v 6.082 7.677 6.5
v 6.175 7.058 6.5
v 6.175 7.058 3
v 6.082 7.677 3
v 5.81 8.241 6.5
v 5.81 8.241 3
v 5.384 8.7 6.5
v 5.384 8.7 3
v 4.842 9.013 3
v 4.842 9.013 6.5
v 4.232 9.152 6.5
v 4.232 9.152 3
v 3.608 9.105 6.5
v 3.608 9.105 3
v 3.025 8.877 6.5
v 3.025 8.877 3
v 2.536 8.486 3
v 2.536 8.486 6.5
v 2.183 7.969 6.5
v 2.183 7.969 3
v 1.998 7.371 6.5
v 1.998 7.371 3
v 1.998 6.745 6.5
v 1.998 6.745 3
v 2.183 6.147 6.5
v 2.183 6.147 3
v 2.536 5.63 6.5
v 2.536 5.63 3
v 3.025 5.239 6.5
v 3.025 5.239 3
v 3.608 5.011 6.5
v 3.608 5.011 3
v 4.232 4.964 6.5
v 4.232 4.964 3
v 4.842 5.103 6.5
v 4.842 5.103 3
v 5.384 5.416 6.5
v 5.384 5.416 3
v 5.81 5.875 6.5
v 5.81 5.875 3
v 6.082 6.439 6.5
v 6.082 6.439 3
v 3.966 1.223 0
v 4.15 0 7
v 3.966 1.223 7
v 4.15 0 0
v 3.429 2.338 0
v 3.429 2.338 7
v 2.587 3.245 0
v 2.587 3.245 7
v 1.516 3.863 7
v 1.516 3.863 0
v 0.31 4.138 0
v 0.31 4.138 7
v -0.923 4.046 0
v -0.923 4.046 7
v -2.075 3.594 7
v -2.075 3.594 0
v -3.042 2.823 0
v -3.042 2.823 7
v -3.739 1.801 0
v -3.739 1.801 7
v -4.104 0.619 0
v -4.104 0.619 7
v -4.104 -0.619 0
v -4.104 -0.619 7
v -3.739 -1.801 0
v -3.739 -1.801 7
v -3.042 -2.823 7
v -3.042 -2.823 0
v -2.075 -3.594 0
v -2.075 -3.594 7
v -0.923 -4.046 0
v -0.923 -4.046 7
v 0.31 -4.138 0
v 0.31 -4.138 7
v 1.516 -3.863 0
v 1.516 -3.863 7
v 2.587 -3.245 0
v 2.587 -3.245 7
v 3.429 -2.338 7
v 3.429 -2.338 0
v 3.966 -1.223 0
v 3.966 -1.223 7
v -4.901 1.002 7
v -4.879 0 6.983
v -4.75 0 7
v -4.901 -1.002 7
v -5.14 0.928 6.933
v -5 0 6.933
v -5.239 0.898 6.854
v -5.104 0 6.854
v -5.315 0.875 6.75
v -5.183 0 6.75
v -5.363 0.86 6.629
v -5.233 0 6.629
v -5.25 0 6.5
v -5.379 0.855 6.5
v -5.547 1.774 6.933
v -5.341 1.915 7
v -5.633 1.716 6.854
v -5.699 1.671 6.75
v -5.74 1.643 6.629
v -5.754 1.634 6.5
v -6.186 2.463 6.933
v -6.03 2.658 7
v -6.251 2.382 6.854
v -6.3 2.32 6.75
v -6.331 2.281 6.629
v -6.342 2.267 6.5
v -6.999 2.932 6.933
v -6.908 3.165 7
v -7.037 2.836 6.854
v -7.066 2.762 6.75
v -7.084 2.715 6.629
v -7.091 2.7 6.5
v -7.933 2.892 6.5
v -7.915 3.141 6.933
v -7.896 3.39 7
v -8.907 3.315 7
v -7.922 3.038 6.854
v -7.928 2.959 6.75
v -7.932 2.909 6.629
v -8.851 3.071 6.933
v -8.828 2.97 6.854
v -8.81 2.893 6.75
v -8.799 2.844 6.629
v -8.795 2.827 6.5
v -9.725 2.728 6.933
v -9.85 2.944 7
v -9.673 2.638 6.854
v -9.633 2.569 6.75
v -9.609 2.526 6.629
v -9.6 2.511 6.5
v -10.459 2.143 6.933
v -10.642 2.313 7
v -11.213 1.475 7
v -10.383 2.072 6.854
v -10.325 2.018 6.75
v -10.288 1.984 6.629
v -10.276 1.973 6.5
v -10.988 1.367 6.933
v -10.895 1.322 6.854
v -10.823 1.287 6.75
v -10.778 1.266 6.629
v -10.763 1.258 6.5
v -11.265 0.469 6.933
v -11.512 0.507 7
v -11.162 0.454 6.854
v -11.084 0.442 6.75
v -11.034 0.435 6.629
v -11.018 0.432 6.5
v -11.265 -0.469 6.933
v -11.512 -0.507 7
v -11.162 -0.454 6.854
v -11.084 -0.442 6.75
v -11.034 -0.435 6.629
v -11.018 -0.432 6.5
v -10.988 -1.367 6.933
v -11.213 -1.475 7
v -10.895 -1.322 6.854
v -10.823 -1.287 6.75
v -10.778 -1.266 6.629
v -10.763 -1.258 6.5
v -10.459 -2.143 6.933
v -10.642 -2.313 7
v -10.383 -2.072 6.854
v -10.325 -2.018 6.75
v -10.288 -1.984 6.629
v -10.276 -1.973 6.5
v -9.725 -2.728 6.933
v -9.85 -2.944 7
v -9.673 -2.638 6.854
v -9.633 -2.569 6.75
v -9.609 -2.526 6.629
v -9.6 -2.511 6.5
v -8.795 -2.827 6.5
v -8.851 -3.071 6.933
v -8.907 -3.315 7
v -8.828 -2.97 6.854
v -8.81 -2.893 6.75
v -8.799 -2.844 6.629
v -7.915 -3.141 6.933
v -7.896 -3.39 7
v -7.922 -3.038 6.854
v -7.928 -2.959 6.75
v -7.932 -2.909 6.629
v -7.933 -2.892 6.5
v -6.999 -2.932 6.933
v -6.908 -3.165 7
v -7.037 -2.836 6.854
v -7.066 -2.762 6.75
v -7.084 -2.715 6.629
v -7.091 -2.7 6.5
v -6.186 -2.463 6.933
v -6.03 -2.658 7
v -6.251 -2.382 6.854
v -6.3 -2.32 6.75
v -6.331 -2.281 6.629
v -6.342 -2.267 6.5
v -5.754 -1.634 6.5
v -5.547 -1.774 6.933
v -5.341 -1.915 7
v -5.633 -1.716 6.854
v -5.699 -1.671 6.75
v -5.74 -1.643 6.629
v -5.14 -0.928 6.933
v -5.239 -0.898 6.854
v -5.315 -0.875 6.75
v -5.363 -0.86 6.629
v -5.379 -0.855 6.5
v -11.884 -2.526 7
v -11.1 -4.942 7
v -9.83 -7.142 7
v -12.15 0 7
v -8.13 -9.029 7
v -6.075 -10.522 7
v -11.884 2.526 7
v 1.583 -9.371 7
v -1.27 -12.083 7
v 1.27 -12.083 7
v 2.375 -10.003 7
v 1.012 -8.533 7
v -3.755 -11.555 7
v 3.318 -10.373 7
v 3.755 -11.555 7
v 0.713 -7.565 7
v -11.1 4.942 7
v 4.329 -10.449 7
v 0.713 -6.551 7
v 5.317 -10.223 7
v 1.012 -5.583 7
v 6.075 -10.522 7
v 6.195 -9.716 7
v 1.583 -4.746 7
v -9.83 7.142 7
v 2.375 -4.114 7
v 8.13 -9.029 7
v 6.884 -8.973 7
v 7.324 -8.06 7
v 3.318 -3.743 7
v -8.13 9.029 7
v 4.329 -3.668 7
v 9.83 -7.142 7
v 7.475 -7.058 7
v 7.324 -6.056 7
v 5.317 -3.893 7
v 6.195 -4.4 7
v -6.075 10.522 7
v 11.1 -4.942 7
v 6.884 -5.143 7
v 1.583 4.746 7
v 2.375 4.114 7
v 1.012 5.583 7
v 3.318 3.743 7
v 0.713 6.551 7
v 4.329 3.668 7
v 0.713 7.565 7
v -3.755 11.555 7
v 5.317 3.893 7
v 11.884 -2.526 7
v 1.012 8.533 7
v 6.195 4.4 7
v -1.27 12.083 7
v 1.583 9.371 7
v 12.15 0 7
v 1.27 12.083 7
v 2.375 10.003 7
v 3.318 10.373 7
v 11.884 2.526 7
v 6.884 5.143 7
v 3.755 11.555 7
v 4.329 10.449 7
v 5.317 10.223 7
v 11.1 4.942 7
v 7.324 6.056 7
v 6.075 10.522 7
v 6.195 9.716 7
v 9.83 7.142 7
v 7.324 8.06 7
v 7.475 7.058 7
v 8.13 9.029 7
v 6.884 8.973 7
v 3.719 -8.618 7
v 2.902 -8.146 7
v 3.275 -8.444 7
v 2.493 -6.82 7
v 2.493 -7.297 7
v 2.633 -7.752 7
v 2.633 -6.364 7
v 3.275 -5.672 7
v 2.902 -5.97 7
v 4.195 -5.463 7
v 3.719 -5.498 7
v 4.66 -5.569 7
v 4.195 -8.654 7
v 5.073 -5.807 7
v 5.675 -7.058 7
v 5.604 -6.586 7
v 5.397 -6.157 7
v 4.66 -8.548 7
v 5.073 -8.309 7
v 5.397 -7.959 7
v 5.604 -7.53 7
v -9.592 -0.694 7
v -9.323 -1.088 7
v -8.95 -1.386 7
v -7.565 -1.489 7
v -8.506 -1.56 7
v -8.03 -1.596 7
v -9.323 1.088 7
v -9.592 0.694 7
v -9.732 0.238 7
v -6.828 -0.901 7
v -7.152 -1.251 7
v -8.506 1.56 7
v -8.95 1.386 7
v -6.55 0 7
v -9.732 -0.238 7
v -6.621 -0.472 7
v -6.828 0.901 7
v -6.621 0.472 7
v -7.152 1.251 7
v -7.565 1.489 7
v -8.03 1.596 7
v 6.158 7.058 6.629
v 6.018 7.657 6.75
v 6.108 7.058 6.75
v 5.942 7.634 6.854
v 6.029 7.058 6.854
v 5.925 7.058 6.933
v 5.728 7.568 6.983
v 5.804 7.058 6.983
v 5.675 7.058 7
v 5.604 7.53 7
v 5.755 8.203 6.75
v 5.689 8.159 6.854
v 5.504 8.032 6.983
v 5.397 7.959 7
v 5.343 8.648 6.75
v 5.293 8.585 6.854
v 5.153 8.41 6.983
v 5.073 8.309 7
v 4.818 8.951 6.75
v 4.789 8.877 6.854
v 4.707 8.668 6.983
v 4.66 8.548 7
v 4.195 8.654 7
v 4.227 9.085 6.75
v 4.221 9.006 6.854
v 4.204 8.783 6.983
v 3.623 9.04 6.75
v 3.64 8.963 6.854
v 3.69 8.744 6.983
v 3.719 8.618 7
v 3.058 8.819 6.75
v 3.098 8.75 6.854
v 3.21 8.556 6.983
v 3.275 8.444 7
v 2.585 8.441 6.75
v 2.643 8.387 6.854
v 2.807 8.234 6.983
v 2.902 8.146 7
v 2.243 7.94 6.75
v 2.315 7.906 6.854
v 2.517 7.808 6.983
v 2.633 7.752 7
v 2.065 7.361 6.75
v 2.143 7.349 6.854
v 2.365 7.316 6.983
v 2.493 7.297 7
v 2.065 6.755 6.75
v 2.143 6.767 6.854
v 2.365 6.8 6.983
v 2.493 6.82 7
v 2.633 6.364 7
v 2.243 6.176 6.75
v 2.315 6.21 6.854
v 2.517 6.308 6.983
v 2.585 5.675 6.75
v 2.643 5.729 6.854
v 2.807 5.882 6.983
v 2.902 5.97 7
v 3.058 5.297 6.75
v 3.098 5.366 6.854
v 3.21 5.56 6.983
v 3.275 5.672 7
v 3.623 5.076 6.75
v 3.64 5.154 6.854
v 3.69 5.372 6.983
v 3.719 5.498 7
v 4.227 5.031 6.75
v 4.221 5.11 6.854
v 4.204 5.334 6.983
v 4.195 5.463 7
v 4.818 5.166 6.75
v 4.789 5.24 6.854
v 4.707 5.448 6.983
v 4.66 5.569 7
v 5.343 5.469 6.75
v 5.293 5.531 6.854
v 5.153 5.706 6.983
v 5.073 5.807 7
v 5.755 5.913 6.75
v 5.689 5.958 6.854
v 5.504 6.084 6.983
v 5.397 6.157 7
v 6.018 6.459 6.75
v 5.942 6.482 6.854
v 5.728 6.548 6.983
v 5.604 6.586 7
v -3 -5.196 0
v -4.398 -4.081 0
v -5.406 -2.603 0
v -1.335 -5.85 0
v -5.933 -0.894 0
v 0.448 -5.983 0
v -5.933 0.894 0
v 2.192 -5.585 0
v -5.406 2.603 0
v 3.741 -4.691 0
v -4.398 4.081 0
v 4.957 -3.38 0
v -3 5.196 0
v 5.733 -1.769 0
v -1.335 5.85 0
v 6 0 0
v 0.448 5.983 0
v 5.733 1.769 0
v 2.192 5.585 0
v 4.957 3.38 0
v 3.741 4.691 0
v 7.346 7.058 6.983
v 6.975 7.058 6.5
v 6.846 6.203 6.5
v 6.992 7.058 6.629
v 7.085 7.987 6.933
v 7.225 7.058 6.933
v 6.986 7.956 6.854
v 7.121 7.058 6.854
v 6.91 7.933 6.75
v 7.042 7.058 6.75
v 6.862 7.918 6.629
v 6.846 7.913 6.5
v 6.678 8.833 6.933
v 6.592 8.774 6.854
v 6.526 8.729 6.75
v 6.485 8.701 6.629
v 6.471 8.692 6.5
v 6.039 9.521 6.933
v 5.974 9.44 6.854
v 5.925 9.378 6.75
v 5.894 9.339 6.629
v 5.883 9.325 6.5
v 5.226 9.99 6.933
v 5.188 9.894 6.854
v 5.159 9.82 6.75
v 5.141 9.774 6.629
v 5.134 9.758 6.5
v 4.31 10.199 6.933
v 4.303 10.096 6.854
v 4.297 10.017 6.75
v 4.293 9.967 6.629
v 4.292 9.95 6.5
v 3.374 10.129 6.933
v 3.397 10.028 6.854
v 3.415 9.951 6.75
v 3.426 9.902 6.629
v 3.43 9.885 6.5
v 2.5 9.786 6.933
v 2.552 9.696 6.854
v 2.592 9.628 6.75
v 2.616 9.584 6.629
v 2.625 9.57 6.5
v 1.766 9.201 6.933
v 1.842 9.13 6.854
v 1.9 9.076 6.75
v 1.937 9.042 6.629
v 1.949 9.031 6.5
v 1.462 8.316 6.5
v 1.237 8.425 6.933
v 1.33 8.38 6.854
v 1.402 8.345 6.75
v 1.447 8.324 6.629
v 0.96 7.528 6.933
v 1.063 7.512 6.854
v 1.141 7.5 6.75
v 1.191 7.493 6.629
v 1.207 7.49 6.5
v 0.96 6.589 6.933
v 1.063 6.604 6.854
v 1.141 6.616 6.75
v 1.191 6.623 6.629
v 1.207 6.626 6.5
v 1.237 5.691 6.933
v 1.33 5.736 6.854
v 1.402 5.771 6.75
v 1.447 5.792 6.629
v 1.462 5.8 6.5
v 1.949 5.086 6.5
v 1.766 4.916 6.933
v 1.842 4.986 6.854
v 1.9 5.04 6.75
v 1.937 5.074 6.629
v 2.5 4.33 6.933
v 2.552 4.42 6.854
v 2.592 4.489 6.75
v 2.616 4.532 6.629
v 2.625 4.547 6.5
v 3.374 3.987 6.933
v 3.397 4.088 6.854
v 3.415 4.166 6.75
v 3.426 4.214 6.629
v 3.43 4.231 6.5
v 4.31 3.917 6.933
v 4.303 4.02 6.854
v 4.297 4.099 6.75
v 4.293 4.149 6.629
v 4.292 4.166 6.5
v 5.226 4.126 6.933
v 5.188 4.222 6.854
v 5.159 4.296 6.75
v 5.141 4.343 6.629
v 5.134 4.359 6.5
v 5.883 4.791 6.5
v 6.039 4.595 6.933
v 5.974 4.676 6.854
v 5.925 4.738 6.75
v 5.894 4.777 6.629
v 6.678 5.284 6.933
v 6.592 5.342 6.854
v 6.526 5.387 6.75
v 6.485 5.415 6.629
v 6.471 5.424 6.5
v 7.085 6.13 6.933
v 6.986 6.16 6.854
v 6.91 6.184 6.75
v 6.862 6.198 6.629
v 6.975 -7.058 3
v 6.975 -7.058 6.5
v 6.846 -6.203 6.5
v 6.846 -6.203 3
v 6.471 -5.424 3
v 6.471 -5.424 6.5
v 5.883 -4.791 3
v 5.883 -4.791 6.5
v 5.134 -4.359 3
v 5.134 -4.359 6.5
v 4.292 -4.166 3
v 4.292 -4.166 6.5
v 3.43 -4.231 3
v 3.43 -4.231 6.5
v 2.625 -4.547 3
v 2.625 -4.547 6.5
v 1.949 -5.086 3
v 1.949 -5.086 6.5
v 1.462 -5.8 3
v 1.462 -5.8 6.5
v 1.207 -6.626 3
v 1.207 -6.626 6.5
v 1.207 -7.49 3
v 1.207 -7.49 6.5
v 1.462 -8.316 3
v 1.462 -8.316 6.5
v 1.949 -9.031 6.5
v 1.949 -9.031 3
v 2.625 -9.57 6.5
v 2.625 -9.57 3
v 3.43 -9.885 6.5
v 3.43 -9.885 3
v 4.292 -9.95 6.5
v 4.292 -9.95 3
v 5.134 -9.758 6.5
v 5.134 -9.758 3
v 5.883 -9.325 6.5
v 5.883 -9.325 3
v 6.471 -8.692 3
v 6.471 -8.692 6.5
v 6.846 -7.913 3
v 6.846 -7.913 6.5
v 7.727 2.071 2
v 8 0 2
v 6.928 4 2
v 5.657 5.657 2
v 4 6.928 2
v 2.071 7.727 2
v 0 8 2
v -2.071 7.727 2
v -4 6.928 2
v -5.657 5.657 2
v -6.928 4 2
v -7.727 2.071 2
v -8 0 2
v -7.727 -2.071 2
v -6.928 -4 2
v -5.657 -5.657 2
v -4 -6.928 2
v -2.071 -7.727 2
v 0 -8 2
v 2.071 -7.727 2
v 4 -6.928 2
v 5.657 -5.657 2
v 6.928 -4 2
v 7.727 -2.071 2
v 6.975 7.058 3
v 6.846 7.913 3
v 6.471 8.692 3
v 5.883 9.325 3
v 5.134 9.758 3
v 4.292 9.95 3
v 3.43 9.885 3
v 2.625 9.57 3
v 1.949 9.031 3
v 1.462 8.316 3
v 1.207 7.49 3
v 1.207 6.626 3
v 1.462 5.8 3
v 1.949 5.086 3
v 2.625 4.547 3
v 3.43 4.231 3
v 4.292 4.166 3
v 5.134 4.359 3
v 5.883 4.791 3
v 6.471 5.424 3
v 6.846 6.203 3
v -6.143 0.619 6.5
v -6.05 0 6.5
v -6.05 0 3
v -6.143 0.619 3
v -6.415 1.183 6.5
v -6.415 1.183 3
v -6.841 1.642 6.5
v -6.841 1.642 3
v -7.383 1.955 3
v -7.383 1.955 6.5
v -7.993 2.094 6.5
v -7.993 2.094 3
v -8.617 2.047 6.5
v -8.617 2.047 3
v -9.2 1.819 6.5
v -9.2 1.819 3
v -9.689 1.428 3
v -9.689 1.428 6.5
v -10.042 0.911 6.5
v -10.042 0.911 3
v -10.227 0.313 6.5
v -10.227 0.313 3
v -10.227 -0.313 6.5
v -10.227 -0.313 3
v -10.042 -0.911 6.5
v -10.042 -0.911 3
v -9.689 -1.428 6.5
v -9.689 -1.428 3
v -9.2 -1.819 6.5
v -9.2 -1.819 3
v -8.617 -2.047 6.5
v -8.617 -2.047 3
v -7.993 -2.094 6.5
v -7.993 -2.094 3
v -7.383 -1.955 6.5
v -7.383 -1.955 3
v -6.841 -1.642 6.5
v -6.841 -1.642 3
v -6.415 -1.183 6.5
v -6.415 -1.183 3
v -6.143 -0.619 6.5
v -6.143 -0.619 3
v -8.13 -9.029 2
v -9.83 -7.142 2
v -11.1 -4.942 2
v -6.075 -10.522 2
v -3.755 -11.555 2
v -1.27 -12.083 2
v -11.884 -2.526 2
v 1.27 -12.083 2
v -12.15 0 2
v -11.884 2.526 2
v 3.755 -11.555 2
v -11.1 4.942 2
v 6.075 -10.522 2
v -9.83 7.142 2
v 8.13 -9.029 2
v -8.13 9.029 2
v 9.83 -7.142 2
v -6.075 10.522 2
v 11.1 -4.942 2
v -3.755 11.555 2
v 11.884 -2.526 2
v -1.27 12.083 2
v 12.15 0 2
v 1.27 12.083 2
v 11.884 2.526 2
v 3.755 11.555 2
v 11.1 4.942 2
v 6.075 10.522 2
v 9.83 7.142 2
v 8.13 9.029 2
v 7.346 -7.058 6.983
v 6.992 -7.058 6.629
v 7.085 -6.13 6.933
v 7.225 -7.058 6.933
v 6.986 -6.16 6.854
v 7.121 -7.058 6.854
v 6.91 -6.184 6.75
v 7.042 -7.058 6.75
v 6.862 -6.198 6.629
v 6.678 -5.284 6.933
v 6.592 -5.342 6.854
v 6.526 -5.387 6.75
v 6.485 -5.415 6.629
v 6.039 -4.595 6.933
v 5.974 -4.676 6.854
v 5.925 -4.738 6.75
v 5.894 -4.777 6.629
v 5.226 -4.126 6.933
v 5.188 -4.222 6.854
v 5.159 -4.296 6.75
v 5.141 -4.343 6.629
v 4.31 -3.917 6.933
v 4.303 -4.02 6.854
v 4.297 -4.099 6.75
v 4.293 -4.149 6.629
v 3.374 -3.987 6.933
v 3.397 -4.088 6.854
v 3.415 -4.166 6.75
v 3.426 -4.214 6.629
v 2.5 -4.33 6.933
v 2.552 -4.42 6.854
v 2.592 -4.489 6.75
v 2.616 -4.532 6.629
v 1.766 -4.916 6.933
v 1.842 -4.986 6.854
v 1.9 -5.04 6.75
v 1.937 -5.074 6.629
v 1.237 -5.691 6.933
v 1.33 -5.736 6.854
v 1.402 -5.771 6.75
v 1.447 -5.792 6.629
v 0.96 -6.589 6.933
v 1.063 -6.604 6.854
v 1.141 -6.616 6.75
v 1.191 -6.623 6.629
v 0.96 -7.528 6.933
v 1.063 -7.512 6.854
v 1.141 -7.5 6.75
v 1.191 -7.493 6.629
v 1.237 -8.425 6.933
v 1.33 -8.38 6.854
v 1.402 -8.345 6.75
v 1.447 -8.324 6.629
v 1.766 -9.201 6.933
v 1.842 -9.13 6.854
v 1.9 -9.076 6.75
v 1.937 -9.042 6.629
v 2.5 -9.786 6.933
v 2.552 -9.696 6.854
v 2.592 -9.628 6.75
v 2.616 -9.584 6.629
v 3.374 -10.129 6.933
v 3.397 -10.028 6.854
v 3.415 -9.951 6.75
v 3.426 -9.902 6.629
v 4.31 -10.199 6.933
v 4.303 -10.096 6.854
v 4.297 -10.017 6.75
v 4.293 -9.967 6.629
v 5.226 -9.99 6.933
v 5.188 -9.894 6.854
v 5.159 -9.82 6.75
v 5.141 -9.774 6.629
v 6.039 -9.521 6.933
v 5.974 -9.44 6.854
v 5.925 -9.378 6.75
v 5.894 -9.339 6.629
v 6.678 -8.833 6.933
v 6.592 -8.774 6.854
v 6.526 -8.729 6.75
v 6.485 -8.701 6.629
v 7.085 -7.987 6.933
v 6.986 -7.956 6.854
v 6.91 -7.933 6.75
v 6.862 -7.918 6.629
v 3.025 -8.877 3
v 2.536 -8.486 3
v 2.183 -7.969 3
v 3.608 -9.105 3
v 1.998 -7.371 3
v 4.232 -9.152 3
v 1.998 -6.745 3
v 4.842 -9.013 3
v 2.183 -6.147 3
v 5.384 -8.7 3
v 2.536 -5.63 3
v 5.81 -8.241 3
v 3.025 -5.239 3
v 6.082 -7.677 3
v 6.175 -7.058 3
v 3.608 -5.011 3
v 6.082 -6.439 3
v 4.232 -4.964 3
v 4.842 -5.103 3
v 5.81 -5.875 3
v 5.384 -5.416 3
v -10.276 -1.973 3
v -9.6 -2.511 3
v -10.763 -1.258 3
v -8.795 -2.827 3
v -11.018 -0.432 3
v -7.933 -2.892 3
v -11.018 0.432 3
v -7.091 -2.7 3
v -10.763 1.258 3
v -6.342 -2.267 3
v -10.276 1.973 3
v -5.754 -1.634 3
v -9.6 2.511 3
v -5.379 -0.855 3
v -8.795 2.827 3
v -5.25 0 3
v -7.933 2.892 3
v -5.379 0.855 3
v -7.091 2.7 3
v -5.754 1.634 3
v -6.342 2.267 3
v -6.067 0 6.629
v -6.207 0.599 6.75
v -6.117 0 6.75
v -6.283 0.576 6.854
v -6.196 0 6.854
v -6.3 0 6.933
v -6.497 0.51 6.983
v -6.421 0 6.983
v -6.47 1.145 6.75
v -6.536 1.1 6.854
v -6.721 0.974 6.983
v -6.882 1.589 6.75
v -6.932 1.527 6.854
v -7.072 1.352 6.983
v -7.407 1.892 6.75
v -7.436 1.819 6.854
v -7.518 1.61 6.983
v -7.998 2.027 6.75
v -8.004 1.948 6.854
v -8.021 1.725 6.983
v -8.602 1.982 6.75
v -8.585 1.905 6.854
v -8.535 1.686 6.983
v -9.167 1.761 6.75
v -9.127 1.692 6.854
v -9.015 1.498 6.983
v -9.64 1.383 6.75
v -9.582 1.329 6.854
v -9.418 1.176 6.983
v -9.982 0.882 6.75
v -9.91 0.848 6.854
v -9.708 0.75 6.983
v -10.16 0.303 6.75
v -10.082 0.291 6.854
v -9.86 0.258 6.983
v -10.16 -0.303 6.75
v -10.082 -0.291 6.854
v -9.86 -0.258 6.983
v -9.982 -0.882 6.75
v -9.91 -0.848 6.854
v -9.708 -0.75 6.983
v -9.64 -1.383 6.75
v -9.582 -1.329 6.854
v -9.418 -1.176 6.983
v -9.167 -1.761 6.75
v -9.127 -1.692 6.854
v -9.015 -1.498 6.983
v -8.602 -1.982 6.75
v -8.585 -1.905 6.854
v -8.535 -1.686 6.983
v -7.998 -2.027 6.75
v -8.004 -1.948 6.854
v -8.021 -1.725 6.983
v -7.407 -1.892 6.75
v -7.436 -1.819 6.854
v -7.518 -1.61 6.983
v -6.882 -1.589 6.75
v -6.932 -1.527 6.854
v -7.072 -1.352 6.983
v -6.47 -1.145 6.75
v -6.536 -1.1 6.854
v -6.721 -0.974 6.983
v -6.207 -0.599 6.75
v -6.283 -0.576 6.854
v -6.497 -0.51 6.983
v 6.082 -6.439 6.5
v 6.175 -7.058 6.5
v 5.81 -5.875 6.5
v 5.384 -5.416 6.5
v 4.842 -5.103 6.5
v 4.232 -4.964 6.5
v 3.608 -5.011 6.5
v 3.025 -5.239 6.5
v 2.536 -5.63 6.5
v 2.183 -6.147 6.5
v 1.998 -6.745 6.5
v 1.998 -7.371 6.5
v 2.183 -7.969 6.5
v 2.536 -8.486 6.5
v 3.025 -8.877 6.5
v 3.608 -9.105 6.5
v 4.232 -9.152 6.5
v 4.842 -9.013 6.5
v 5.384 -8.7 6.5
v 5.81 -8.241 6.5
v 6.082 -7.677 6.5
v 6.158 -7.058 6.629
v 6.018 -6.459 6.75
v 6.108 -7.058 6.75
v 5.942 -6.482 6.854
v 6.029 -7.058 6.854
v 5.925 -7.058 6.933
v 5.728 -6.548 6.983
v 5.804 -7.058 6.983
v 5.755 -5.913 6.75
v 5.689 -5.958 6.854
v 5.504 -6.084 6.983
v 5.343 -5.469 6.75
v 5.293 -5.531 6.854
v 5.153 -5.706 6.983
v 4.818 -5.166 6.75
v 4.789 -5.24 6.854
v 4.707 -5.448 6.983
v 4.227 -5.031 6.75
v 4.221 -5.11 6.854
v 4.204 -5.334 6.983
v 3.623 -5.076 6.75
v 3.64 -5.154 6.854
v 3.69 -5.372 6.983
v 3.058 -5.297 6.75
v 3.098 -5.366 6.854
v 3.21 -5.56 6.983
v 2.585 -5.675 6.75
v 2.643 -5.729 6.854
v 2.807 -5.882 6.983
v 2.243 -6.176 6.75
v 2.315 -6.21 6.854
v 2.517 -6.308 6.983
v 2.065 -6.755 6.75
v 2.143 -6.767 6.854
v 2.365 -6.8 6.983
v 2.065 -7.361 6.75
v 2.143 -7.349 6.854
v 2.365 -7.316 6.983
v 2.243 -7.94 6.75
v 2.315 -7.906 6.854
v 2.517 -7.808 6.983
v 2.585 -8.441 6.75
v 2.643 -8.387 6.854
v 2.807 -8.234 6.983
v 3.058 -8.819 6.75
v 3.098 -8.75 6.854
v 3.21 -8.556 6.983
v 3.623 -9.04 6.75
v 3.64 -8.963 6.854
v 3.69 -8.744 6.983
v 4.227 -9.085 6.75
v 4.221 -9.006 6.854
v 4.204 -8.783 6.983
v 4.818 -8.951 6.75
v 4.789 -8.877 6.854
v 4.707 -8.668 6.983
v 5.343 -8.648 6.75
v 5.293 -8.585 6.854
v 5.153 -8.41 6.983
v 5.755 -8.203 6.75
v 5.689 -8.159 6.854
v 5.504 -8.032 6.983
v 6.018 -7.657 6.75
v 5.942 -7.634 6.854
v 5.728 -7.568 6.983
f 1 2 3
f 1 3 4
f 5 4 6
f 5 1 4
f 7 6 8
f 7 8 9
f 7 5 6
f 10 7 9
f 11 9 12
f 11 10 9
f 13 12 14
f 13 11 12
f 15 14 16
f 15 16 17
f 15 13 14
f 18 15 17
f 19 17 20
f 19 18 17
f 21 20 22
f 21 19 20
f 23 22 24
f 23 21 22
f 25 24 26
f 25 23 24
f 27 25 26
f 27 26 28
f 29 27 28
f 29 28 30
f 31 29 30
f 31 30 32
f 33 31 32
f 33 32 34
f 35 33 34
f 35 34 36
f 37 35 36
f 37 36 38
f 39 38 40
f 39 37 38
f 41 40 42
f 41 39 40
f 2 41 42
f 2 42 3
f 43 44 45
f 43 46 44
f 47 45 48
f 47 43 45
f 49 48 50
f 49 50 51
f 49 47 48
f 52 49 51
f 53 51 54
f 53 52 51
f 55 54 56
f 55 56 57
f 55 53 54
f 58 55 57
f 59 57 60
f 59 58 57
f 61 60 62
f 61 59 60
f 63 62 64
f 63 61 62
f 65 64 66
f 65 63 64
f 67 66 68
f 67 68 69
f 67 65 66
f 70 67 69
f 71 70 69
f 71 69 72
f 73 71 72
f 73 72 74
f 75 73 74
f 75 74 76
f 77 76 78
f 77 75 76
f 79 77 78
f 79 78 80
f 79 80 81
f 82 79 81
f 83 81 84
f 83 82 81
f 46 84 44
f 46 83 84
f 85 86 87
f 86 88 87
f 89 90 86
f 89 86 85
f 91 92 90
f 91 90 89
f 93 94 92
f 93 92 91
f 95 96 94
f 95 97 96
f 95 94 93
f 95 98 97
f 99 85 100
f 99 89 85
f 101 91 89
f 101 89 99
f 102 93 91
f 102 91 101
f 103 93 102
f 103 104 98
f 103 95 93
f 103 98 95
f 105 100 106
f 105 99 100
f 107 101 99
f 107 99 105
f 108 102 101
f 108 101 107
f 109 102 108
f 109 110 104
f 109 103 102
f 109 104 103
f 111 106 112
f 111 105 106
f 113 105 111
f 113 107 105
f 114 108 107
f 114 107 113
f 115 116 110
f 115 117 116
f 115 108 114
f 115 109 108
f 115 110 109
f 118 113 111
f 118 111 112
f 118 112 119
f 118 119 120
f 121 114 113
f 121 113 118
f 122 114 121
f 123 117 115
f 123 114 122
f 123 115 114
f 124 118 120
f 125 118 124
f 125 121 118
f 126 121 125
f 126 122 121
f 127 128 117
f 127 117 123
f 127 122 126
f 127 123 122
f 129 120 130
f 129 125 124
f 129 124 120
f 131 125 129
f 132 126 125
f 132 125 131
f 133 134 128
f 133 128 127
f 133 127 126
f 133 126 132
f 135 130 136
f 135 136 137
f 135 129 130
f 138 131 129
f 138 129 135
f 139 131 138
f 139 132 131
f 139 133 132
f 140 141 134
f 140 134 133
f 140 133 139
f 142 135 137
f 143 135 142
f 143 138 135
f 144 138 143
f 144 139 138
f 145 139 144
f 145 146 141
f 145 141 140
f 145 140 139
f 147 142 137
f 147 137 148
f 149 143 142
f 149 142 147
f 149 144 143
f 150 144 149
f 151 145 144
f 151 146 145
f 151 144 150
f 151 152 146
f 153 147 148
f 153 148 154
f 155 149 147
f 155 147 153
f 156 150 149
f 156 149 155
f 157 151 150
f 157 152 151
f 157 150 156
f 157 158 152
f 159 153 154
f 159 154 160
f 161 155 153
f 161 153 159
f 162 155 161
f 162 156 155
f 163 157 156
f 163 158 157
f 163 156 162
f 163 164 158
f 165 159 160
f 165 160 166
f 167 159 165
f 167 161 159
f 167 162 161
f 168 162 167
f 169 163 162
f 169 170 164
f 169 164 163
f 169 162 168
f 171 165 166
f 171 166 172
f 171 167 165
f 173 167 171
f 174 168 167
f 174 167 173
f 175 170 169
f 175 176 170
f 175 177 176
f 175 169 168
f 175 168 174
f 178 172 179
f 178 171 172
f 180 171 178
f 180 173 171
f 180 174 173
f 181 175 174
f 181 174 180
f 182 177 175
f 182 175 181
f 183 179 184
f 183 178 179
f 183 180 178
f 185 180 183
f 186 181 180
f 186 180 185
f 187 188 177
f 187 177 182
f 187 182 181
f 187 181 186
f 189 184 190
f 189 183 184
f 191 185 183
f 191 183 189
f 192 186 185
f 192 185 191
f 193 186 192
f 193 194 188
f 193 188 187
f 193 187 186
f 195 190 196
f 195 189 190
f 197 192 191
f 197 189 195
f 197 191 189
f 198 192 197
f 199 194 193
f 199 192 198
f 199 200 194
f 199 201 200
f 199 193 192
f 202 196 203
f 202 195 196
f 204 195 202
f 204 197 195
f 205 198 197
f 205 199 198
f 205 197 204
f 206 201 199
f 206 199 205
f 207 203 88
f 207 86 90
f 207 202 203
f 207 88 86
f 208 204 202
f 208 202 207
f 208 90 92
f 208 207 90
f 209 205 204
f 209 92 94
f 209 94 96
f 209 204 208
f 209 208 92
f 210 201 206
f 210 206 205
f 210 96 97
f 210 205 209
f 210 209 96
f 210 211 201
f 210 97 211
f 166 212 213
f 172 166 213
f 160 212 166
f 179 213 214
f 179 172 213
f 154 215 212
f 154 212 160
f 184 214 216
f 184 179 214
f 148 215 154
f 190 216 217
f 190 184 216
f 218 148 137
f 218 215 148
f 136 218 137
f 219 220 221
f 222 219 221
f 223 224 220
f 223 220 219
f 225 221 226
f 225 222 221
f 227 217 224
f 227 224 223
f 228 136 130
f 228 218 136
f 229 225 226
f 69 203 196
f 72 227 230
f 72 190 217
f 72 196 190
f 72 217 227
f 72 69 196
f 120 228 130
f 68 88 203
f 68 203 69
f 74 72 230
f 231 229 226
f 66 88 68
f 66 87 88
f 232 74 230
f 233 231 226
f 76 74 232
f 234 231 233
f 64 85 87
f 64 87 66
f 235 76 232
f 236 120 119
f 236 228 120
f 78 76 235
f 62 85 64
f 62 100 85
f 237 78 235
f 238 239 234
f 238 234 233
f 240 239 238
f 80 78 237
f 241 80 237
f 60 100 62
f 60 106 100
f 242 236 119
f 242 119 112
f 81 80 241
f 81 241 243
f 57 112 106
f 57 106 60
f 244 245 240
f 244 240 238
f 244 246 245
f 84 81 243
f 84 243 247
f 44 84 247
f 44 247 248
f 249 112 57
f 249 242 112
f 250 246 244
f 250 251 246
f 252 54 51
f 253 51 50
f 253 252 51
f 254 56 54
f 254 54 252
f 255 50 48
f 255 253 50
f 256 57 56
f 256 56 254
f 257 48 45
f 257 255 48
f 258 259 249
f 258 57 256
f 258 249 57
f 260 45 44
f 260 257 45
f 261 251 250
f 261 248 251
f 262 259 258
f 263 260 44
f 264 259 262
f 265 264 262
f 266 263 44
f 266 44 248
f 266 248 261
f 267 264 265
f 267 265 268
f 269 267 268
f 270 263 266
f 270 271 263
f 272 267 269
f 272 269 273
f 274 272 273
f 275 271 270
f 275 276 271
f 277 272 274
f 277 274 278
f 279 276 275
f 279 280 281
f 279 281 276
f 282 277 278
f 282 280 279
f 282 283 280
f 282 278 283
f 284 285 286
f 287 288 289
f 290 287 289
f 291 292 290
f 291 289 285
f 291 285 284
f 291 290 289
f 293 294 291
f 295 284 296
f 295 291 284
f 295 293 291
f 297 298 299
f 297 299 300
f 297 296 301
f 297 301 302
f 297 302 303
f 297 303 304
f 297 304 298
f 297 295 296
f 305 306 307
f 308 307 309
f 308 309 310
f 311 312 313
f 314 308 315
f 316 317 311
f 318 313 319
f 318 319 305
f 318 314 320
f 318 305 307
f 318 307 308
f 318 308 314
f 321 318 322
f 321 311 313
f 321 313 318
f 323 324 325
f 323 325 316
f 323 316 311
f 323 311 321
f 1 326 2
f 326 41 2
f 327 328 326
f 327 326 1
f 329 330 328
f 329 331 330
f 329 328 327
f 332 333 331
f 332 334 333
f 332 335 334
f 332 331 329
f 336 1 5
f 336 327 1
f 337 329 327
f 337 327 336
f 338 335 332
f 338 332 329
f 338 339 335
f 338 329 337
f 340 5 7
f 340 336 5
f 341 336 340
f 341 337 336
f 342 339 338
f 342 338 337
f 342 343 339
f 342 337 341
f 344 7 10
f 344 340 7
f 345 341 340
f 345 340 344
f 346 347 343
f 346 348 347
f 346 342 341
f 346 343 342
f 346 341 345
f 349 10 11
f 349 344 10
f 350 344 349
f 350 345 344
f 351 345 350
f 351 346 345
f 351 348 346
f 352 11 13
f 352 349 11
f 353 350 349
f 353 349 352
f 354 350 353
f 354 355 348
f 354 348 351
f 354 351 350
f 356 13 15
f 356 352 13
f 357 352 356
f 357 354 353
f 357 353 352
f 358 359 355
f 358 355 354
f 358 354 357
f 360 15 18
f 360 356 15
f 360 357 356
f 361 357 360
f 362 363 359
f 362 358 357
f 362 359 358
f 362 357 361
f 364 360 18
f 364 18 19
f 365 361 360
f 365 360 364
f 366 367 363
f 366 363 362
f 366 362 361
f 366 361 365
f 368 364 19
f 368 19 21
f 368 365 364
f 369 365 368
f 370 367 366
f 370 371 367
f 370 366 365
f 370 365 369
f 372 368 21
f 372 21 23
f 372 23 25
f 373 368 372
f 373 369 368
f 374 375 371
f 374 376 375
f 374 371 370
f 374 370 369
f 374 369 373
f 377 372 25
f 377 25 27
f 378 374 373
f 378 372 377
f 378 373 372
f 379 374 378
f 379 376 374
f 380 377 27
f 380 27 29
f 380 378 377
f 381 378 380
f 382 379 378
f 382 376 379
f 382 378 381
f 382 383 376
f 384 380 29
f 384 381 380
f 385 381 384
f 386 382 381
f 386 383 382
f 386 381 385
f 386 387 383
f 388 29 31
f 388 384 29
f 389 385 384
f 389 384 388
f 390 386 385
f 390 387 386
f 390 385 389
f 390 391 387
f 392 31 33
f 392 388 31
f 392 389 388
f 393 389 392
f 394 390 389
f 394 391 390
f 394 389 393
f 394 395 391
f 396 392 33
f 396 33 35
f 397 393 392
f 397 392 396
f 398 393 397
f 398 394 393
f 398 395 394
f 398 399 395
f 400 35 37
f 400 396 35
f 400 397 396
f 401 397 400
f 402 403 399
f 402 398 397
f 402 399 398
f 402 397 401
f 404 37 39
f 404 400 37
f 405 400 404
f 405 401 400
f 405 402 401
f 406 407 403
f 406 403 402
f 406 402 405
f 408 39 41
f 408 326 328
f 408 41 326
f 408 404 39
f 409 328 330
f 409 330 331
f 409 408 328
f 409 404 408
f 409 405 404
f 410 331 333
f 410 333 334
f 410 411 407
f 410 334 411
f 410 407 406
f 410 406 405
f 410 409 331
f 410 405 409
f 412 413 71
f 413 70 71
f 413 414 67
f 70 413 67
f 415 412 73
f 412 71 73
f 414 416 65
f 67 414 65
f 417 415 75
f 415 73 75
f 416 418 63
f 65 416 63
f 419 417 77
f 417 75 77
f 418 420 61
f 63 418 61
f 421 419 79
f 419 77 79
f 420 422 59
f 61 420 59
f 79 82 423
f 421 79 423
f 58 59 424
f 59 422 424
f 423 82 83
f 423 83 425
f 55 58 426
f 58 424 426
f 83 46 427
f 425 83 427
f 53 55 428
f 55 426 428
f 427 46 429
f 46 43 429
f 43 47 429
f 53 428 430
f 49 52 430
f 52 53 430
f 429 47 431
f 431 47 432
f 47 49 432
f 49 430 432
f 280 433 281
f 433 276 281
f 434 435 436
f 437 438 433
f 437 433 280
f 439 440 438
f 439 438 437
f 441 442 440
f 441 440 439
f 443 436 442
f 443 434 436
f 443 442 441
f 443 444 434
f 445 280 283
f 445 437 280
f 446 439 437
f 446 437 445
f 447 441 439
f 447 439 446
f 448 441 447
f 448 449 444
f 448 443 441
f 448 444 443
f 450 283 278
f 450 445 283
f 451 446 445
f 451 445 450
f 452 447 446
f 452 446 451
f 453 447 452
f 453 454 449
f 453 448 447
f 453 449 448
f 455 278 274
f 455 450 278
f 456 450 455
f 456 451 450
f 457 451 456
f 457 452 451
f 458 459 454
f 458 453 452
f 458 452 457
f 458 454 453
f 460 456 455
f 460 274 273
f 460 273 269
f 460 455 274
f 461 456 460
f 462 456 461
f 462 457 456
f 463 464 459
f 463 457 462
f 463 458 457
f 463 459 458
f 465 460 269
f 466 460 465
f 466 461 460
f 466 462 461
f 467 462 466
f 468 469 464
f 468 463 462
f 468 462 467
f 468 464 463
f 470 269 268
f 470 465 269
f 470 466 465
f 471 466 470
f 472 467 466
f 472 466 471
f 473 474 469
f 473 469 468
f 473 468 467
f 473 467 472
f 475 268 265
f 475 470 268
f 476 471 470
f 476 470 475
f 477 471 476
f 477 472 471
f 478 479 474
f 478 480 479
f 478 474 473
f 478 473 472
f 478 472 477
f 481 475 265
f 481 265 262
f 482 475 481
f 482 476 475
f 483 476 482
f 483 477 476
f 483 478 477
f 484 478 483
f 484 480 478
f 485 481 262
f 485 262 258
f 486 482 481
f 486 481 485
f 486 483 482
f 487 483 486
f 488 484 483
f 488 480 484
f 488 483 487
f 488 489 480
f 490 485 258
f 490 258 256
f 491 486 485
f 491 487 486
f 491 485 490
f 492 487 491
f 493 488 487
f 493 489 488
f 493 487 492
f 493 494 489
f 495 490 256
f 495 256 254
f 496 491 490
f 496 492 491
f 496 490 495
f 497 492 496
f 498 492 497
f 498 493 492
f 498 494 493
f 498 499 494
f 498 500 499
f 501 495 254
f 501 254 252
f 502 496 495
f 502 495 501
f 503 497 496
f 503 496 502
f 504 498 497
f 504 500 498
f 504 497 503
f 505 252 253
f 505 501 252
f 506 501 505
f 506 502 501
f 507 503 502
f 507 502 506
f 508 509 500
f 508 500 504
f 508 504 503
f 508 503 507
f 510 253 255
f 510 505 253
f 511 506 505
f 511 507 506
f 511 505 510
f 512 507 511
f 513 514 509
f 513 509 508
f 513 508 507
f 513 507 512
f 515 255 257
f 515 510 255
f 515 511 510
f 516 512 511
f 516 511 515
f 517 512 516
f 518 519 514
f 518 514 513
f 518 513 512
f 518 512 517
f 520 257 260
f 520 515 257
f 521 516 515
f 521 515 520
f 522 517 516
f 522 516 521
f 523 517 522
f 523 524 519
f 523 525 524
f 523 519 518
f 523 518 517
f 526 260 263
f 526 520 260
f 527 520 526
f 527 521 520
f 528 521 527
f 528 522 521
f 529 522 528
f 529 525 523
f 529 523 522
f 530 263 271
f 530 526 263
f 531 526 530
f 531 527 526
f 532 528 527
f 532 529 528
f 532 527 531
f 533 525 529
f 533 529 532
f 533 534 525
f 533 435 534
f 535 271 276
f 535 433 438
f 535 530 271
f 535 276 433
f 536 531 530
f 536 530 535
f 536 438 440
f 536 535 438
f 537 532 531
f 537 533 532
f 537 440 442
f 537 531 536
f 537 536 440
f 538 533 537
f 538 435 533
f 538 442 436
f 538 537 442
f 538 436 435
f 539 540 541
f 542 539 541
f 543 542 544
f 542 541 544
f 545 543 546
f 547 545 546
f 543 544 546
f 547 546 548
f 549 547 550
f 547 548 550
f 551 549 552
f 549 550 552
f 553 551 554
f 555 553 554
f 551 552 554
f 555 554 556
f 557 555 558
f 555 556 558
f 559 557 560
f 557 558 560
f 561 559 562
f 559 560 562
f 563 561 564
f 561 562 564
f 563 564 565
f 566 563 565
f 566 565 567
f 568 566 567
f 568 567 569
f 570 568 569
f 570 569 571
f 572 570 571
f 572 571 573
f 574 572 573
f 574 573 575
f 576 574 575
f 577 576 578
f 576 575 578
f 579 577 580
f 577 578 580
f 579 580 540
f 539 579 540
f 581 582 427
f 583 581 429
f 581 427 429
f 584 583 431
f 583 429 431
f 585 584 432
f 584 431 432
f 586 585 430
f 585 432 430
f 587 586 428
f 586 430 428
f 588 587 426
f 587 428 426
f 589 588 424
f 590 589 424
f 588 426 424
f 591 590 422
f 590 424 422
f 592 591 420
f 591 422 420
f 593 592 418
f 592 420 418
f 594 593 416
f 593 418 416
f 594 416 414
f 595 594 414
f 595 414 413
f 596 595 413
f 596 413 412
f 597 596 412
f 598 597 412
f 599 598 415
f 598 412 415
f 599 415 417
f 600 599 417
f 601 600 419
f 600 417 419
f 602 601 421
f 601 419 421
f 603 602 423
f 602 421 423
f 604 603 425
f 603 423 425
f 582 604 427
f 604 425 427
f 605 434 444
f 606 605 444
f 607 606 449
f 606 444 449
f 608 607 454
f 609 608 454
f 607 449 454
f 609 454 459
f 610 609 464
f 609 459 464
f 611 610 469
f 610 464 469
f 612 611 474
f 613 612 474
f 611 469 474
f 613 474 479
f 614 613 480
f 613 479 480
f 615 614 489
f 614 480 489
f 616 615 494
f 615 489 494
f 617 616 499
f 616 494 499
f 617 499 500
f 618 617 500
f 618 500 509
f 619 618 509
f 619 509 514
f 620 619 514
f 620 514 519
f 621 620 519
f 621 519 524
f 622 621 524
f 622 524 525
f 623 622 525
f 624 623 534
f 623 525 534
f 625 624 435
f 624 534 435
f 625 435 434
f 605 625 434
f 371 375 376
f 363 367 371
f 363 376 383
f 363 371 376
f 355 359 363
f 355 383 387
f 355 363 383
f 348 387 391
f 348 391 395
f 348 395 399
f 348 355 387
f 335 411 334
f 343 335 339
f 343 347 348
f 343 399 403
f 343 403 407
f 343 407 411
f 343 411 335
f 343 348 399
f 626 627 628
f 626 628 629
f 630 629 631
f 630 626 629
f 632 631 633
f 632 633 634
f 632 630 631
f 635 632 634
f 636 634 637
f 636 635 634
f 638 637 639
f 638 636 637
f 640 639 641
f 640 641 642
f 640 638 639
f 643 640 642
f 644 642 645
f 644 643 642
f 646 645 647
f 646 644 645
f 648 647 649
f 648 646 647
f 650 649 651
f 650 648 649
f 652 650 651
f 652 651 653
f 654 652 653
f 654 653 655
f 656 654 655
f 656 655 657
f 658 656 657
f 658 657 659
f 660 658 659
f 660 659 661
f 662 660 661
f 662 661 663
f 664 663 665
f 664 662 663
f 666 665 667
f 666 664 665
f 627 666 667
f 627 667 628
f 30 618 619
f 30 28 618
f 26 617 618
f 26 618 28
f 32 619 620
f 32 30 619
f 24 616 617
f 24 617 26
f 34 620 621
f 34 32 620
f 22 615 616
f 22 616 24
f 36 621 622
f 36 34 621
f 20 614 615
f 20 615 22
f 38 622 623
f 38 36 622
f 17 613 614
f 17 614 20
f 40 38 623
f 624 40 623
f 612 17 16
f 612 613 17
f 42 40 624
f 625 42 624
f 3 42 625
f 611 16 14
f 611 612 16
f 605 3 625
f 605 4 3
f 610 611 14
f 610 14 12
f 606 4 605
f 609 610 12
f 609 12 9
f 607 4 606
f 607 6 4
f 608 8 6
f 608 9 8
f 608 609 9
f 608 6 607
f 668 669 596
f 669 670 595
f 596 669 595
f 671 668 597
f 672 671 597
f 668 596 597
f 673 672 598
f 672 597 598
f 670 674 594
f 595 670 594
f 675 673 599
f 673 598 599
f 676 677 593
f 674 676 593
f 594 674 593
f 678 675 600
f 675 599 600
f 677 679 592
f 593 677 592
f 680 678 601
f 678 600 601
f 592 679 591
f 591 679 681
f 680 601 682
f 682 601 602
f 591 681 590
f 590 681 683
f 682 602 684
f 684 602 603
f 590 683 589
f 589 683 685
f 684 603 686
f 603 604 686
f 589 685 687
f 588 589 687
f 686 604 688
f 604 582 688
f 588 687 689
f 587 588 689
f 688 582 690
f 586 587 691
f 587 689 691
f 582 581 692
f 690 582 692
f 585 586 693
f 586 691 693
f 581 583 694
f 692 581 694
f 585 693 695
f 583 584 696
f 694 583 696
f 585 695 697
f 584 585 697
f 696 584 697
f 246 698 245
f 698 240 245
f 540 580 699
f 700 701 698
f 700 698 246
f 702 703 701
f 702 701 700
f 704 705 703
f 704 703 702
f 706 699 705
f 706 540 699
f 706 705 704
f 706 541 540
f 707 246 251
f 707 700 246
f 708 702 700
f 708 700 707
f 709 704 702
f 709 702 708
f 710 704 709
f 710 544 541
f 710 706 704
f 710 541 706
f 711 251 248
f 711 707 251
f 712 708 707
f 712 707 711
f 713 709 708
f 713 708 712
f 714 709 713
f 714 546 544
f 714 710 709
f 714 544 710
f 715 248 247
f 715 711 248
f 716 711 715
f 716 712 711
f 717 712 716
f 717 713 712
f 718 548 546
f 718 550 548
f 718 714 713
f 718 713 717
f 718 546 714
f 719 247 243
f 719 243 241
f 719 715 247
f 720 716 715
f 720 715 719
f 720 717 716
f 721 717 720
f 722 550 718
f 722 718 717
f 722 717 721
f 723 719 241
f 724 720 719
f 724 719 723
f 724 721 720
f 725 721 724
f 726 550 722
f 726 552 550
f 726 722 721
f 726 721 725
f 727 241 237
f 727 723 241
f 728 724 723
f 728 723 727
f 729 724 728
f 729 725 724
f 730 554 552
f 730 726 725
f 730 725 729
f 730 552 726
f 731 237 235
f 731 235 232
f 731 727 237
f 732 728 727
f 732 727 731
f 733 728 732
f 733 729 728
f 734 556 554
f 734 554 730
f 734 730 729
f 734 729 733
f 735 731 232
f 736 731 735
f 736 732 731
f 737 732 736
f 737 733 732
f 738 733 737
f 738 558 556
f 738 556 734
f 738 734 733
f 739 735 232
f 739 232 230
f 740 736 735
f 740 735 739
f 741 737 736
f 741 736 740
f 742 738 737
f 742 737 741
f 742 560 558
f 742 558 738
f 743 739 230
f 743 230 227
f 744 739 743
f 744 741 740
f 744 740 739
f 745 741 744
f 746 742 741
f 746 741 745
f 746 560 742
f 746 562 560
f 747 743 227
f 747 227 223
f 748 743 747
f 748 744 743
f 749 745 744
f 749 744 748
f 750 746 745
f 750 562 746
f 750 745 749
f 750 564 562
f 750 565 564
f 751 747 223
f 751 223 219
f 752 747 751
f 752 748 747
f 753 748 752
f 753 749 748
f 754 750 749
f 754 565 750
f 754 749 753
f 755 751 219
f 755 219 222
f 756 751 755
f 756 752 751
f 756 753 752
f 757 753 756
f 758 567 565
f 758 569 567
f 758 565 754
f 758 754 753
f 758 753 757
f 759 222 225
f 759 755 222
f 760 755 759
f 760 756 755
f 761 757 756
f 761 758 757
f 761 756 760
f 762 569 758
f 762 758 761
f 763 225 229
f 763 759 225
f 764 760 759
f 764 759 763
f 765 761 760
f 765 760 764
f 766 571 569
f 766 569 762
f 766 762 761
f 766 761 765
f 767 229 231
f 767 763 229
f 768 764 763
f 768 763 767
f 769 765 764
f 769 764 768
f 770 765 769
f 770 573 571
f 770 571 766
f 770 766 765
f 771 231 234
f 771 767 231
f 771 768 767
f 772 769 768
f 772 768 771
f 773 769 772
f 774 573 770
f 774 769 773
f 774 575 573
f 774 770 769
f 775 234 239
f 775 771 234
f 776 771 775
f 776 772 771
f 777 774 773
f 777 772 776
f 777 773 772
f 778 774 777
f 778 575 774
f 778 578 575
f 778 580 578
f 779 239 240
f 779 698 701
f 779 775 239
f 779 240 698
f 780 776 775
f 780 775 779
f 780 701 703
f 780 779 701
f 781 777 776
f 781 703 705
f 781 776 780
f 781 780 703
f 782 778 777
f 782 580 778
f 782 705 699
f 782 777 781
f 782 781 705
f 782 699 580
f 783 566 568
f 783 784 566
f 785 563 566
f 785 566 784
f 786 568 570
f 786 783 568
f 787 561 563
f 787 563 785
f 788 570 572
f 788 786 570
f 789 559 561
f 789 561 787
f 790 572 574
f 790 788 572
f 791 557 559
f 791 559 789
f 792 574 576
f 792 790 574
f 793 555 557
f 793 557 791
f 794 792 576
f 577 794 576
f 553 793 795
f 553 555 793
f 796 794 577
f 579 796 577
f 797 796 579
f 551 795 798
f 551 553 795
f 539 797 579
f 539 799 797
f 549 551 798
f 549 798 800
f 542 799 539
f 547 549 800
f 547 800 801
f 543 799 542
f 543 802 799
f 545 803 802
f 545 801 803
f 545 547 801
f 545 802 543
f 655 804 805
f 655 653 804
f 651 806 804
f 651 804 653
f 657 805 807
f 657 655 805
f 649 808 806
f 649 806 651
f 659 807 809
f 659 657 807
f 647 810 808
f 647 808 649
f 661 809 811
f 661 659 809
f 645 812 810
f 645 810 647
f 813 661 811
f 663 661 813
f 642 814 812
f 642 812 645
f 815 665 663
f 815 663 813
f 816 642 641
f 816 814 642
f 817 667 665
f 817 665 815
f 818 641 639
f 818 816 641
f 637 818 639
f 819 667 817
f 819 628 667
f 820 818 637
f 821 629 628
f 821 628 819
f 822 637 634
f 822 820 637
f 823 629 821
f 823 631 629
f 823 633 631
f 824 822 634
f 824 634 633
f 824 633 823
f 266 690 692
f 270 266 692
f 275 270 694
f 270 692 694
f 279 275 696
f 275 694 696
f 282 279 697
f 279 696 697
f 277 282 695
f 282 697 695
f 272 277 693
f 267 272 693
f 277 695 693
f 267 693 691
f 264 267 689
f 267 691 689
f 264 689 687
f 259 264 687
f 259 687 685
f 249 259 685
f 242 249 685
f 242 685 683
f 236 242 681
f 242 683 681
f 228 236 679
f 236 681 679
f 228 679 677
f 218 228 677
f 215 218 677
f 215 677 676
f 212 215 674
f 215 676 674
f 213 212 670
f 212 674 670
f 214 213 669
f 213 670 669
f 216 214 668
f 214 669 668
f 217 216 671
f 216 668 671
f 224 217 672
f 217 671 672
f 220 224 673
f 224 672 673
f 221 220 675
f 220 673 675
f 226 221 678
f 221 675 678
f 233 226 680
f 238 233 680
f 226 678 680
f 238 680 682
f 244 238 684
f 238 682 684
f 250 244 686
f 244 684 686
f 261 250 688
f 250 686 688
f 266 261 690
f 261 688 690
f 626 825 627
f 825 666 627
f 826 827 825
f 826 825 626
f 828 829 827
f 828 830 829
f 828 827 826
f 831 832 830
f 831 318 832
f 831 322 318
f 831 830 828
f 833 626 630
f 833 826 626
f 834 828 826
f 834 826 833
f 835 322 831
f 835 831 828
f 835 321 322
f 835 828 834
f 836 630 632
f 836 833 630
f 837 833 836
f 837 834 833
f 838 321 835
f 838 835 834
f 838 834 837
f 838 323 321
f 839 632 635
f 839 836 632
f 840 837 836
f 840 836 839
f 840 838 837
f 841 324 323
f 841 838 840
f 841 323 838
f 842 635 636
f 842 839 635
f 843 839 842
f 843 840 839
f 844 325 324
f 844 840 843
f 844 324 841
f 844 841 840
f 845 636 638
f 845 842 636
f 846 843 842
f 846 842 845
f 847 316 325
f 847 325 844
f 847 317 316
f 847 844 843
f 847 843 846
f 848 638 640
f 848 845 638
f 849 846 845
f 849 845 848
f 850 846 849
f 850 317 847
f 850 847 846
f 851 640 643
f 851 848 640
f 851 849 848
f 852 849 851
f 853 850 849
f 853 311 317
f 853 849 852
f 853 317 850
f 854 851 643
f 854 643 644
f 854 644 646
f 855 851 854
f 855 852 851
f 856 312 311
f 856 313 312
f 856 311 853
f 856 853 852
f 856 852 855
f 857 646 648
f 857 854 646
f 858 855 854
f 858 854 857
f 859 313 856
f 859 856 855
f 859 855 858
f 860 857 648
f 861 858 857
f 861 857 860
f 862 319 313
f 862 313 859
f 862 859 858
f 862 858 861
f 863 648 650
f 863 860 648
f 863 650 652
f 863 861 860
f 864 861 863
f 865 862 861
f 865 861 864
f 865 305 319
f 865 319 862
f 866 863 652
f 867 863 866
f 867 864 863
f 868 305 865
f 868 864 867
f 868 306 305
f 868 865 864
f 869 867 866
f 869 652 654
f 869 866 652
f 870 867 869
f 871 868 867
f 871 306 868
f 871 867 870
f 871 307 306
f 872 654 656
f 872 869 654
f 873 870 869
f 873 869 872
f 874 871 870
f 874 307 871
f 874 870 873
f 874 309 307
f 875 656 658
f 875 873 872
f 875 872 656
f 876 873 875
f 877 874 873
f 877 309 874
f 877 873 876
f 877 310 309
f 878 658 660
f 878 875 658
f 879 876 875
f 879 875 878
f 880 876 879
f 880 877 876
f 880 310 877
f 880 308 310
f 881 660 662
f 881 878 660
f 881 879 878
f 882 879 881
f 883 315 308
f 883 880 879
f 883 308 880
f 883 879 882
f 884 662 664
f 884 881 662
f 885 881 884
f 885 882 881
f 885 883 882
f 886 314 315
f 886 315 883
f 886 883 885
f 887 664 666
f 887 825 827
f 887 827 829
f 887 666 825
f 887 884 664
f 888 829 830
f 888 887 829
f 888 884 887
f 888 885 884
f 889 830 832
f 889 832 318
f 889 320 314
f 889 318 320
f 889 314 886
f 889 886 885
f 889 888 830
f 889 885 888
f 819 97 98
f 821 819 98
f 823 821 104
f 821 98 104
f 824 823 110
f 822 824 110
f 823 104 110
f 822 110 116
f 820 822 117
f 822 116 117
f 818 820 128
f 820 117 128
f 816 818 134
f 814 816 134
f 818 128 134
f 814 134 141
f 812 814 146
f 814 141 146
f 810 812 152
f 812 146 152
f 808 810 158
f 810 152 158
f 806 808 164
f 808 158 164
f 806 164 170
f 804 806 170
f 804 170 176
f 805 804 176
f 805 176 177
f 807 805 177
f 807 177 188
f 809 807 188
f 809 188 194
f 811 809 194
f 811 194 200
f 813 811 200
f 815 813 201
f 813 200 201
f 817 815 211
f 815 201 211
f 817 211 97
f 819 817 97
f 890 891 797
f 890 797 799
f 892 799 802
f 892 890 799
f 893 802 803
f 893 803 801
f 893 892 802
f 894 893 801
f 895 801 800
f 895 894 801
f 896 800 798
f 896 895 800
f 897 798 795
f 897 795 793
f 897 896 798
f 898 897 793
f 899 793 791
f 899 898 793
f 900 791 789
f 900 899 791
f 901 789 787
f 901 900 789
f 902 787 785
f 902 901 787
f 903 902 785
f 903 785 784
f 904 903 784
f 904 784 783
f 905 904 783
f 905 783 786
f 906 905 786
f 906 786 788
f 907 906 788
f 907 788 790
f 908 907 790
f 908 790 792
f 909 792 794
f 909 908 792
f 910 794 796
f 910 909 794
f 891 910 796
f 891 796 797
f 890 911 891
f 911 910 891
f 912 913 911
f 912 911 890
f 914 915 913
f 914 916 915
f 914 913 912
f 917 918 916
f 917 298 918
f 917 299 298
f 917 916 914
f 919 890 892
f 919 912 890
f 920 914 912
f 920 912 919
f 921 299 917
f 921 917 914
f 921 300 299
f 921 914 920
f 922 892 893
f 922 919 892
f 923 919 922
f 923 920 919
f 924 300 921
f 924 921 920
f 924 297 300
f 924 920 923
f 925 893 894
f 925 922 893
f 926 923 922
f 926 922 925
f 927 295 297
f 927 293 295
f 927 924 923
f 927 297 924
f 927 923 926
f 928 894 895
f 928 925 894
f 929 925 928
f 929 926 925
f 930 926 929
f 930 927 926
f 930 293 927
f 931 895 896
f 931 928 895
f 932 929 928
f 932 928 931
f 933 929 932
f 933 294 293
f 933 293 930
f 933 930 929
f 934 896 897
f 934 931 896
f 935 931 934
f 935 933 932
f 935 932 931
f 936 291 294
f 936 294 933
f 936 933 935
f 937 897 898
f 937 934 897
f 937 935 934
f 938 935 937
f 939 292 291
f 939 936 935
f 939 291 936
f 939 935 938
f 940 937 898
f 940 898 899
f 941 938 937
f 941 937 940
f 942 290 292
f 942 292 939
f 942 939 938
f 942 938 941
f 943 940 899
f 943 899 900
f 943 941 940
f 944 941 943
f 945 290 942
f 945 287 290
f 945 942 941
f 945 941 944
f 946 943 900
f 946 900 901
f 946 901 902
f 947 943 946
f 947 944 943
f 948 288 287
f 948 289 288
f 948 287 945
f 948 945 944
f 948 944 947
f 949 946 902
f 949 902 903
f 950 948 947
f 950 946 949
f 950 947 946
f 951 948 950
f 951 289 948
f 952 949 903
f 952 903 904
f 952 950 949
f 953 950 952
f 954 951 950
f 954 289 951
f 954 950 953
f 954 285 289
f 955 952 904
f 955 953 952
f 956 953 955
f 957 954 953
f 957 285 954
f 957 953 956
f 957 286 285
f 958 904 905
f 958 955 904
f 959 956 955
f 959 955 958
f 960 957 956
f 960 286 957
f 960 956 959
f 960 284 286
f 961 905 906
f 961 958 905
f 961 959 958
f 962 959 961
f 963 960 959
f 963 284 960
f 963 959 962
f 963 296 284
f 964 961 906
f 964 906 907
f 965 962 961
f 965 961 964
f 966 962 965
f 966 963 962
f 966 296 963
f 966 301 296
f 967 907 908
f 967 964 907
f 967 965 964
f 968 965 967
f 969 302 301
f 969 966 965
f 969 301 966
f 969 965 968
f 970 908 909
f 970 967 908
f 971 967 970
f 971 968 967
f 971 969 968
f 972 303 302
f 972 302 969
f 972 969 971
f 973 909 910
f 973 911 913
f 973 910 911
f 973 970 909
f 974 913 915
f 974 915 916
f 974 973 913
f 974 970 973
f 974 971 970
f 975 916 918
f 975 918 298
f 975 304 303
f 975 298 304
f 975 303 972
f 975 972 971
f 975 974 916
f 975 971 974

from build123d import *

# Parameters (mm, degrees)
SKETCH1_R           = 6
SKETCH1_R_2         = 4.15
BOSS_EXTRUDE1_DEPTH = 2
SKETCH2_R           = 12.15
SKETCH2_R_2         = 4.15
BOSS_EXTRUDE2_DEPTH = 5
SKETCH3_R           = 2.9
SKETCH3_R_2         = 2.1
CUT_EXTRUDE1_DEPTH  = 4
FILLET1_R           = 0.5
CHAMFER1_SIZE       = 2


with BuildPart() as part:
    # Sketch1 → Boss-Extrude1 (new body)
    with BuildSketch(Plane.XY):
        Circle(SKETCH1_R)
        Circle(SKETCH1_R_2, mode=Mode.SUBTRACT)
    extrude(amount=BOSS_EXTRUDE1_DEPTH)

    # Sketch2 → Boss-Extrude2 (add)
    with BuildSketch(Plane.XY.offset(2)):
        Circle(SKETCH2_R)
        Circle(SKETCH2_R_2, mode=Mode.SUBTRACT)
    extrude(amount=BOSS_EXTRUDE2_DEPTH)

    # Sketch3 → Cut-Extrude1 (cut)
    # profile 1 of 3: a face of its own
    with BuildSketch(Plane.XY.offset(7)):
        with Locations((-8.15, 0)):
            Circle(SKETCH3_R)
        with Locations((-8.15, 0)):
            Circle(SKETCH3_R_2, mode=Mode.SUBTRACT)
    # profile 2 of 3: a face of its own
    with BuildSketch(Plane.XY.offset(7)):
        with Locations((4.075, 7.058107041)):
            Circle(SKETCH3_R)
        with Locations((4.075, 7.058107041)):
            Circle(SKETCH3_R_2, mode=Mode.SUBTRACT)
    # profile 3 of 3: a face of its own
    with BuildSketch(Plane.XY.offset(7)):
        with Locations((4.075, -7.058107041)):
            Circle(SKETCH3_R)
        with Locations((4.075, -7.058107041)):
            Circle(SKETCH3_R_2, mode=Mode.SUBTRACT)
    extrude(amount=-CUT_EXTRUDE1_DEPTH, mode=Mode.SUBTRACT)

    # Fillet1
    fillet1_edges = [part.edges().sort_by_distance(p)[0] for p in [
        (-11.05, 0, 7),
        (-10.25, 0, 7),
        (1.175, 7.058107041, 7),
        (1.975, 7.058107041, 7),
        (1.175, -7.058107041, 7),
        (1.975, -7.058107041, 7),
    ]]
    fillet(fillet1_edges, radius=FILLET1_R)

    # Chamfer1
    chamfer1_edges = [part.edges().sort_by_distance(p)[0] for p in [
        (-6, 0, 2),
    ]]
    chamfer(chamfer1_edges, length=CHAMFER1_SIZE - 0.0001)  # a hair under: the kernel refuses the full size


solid = part.part
